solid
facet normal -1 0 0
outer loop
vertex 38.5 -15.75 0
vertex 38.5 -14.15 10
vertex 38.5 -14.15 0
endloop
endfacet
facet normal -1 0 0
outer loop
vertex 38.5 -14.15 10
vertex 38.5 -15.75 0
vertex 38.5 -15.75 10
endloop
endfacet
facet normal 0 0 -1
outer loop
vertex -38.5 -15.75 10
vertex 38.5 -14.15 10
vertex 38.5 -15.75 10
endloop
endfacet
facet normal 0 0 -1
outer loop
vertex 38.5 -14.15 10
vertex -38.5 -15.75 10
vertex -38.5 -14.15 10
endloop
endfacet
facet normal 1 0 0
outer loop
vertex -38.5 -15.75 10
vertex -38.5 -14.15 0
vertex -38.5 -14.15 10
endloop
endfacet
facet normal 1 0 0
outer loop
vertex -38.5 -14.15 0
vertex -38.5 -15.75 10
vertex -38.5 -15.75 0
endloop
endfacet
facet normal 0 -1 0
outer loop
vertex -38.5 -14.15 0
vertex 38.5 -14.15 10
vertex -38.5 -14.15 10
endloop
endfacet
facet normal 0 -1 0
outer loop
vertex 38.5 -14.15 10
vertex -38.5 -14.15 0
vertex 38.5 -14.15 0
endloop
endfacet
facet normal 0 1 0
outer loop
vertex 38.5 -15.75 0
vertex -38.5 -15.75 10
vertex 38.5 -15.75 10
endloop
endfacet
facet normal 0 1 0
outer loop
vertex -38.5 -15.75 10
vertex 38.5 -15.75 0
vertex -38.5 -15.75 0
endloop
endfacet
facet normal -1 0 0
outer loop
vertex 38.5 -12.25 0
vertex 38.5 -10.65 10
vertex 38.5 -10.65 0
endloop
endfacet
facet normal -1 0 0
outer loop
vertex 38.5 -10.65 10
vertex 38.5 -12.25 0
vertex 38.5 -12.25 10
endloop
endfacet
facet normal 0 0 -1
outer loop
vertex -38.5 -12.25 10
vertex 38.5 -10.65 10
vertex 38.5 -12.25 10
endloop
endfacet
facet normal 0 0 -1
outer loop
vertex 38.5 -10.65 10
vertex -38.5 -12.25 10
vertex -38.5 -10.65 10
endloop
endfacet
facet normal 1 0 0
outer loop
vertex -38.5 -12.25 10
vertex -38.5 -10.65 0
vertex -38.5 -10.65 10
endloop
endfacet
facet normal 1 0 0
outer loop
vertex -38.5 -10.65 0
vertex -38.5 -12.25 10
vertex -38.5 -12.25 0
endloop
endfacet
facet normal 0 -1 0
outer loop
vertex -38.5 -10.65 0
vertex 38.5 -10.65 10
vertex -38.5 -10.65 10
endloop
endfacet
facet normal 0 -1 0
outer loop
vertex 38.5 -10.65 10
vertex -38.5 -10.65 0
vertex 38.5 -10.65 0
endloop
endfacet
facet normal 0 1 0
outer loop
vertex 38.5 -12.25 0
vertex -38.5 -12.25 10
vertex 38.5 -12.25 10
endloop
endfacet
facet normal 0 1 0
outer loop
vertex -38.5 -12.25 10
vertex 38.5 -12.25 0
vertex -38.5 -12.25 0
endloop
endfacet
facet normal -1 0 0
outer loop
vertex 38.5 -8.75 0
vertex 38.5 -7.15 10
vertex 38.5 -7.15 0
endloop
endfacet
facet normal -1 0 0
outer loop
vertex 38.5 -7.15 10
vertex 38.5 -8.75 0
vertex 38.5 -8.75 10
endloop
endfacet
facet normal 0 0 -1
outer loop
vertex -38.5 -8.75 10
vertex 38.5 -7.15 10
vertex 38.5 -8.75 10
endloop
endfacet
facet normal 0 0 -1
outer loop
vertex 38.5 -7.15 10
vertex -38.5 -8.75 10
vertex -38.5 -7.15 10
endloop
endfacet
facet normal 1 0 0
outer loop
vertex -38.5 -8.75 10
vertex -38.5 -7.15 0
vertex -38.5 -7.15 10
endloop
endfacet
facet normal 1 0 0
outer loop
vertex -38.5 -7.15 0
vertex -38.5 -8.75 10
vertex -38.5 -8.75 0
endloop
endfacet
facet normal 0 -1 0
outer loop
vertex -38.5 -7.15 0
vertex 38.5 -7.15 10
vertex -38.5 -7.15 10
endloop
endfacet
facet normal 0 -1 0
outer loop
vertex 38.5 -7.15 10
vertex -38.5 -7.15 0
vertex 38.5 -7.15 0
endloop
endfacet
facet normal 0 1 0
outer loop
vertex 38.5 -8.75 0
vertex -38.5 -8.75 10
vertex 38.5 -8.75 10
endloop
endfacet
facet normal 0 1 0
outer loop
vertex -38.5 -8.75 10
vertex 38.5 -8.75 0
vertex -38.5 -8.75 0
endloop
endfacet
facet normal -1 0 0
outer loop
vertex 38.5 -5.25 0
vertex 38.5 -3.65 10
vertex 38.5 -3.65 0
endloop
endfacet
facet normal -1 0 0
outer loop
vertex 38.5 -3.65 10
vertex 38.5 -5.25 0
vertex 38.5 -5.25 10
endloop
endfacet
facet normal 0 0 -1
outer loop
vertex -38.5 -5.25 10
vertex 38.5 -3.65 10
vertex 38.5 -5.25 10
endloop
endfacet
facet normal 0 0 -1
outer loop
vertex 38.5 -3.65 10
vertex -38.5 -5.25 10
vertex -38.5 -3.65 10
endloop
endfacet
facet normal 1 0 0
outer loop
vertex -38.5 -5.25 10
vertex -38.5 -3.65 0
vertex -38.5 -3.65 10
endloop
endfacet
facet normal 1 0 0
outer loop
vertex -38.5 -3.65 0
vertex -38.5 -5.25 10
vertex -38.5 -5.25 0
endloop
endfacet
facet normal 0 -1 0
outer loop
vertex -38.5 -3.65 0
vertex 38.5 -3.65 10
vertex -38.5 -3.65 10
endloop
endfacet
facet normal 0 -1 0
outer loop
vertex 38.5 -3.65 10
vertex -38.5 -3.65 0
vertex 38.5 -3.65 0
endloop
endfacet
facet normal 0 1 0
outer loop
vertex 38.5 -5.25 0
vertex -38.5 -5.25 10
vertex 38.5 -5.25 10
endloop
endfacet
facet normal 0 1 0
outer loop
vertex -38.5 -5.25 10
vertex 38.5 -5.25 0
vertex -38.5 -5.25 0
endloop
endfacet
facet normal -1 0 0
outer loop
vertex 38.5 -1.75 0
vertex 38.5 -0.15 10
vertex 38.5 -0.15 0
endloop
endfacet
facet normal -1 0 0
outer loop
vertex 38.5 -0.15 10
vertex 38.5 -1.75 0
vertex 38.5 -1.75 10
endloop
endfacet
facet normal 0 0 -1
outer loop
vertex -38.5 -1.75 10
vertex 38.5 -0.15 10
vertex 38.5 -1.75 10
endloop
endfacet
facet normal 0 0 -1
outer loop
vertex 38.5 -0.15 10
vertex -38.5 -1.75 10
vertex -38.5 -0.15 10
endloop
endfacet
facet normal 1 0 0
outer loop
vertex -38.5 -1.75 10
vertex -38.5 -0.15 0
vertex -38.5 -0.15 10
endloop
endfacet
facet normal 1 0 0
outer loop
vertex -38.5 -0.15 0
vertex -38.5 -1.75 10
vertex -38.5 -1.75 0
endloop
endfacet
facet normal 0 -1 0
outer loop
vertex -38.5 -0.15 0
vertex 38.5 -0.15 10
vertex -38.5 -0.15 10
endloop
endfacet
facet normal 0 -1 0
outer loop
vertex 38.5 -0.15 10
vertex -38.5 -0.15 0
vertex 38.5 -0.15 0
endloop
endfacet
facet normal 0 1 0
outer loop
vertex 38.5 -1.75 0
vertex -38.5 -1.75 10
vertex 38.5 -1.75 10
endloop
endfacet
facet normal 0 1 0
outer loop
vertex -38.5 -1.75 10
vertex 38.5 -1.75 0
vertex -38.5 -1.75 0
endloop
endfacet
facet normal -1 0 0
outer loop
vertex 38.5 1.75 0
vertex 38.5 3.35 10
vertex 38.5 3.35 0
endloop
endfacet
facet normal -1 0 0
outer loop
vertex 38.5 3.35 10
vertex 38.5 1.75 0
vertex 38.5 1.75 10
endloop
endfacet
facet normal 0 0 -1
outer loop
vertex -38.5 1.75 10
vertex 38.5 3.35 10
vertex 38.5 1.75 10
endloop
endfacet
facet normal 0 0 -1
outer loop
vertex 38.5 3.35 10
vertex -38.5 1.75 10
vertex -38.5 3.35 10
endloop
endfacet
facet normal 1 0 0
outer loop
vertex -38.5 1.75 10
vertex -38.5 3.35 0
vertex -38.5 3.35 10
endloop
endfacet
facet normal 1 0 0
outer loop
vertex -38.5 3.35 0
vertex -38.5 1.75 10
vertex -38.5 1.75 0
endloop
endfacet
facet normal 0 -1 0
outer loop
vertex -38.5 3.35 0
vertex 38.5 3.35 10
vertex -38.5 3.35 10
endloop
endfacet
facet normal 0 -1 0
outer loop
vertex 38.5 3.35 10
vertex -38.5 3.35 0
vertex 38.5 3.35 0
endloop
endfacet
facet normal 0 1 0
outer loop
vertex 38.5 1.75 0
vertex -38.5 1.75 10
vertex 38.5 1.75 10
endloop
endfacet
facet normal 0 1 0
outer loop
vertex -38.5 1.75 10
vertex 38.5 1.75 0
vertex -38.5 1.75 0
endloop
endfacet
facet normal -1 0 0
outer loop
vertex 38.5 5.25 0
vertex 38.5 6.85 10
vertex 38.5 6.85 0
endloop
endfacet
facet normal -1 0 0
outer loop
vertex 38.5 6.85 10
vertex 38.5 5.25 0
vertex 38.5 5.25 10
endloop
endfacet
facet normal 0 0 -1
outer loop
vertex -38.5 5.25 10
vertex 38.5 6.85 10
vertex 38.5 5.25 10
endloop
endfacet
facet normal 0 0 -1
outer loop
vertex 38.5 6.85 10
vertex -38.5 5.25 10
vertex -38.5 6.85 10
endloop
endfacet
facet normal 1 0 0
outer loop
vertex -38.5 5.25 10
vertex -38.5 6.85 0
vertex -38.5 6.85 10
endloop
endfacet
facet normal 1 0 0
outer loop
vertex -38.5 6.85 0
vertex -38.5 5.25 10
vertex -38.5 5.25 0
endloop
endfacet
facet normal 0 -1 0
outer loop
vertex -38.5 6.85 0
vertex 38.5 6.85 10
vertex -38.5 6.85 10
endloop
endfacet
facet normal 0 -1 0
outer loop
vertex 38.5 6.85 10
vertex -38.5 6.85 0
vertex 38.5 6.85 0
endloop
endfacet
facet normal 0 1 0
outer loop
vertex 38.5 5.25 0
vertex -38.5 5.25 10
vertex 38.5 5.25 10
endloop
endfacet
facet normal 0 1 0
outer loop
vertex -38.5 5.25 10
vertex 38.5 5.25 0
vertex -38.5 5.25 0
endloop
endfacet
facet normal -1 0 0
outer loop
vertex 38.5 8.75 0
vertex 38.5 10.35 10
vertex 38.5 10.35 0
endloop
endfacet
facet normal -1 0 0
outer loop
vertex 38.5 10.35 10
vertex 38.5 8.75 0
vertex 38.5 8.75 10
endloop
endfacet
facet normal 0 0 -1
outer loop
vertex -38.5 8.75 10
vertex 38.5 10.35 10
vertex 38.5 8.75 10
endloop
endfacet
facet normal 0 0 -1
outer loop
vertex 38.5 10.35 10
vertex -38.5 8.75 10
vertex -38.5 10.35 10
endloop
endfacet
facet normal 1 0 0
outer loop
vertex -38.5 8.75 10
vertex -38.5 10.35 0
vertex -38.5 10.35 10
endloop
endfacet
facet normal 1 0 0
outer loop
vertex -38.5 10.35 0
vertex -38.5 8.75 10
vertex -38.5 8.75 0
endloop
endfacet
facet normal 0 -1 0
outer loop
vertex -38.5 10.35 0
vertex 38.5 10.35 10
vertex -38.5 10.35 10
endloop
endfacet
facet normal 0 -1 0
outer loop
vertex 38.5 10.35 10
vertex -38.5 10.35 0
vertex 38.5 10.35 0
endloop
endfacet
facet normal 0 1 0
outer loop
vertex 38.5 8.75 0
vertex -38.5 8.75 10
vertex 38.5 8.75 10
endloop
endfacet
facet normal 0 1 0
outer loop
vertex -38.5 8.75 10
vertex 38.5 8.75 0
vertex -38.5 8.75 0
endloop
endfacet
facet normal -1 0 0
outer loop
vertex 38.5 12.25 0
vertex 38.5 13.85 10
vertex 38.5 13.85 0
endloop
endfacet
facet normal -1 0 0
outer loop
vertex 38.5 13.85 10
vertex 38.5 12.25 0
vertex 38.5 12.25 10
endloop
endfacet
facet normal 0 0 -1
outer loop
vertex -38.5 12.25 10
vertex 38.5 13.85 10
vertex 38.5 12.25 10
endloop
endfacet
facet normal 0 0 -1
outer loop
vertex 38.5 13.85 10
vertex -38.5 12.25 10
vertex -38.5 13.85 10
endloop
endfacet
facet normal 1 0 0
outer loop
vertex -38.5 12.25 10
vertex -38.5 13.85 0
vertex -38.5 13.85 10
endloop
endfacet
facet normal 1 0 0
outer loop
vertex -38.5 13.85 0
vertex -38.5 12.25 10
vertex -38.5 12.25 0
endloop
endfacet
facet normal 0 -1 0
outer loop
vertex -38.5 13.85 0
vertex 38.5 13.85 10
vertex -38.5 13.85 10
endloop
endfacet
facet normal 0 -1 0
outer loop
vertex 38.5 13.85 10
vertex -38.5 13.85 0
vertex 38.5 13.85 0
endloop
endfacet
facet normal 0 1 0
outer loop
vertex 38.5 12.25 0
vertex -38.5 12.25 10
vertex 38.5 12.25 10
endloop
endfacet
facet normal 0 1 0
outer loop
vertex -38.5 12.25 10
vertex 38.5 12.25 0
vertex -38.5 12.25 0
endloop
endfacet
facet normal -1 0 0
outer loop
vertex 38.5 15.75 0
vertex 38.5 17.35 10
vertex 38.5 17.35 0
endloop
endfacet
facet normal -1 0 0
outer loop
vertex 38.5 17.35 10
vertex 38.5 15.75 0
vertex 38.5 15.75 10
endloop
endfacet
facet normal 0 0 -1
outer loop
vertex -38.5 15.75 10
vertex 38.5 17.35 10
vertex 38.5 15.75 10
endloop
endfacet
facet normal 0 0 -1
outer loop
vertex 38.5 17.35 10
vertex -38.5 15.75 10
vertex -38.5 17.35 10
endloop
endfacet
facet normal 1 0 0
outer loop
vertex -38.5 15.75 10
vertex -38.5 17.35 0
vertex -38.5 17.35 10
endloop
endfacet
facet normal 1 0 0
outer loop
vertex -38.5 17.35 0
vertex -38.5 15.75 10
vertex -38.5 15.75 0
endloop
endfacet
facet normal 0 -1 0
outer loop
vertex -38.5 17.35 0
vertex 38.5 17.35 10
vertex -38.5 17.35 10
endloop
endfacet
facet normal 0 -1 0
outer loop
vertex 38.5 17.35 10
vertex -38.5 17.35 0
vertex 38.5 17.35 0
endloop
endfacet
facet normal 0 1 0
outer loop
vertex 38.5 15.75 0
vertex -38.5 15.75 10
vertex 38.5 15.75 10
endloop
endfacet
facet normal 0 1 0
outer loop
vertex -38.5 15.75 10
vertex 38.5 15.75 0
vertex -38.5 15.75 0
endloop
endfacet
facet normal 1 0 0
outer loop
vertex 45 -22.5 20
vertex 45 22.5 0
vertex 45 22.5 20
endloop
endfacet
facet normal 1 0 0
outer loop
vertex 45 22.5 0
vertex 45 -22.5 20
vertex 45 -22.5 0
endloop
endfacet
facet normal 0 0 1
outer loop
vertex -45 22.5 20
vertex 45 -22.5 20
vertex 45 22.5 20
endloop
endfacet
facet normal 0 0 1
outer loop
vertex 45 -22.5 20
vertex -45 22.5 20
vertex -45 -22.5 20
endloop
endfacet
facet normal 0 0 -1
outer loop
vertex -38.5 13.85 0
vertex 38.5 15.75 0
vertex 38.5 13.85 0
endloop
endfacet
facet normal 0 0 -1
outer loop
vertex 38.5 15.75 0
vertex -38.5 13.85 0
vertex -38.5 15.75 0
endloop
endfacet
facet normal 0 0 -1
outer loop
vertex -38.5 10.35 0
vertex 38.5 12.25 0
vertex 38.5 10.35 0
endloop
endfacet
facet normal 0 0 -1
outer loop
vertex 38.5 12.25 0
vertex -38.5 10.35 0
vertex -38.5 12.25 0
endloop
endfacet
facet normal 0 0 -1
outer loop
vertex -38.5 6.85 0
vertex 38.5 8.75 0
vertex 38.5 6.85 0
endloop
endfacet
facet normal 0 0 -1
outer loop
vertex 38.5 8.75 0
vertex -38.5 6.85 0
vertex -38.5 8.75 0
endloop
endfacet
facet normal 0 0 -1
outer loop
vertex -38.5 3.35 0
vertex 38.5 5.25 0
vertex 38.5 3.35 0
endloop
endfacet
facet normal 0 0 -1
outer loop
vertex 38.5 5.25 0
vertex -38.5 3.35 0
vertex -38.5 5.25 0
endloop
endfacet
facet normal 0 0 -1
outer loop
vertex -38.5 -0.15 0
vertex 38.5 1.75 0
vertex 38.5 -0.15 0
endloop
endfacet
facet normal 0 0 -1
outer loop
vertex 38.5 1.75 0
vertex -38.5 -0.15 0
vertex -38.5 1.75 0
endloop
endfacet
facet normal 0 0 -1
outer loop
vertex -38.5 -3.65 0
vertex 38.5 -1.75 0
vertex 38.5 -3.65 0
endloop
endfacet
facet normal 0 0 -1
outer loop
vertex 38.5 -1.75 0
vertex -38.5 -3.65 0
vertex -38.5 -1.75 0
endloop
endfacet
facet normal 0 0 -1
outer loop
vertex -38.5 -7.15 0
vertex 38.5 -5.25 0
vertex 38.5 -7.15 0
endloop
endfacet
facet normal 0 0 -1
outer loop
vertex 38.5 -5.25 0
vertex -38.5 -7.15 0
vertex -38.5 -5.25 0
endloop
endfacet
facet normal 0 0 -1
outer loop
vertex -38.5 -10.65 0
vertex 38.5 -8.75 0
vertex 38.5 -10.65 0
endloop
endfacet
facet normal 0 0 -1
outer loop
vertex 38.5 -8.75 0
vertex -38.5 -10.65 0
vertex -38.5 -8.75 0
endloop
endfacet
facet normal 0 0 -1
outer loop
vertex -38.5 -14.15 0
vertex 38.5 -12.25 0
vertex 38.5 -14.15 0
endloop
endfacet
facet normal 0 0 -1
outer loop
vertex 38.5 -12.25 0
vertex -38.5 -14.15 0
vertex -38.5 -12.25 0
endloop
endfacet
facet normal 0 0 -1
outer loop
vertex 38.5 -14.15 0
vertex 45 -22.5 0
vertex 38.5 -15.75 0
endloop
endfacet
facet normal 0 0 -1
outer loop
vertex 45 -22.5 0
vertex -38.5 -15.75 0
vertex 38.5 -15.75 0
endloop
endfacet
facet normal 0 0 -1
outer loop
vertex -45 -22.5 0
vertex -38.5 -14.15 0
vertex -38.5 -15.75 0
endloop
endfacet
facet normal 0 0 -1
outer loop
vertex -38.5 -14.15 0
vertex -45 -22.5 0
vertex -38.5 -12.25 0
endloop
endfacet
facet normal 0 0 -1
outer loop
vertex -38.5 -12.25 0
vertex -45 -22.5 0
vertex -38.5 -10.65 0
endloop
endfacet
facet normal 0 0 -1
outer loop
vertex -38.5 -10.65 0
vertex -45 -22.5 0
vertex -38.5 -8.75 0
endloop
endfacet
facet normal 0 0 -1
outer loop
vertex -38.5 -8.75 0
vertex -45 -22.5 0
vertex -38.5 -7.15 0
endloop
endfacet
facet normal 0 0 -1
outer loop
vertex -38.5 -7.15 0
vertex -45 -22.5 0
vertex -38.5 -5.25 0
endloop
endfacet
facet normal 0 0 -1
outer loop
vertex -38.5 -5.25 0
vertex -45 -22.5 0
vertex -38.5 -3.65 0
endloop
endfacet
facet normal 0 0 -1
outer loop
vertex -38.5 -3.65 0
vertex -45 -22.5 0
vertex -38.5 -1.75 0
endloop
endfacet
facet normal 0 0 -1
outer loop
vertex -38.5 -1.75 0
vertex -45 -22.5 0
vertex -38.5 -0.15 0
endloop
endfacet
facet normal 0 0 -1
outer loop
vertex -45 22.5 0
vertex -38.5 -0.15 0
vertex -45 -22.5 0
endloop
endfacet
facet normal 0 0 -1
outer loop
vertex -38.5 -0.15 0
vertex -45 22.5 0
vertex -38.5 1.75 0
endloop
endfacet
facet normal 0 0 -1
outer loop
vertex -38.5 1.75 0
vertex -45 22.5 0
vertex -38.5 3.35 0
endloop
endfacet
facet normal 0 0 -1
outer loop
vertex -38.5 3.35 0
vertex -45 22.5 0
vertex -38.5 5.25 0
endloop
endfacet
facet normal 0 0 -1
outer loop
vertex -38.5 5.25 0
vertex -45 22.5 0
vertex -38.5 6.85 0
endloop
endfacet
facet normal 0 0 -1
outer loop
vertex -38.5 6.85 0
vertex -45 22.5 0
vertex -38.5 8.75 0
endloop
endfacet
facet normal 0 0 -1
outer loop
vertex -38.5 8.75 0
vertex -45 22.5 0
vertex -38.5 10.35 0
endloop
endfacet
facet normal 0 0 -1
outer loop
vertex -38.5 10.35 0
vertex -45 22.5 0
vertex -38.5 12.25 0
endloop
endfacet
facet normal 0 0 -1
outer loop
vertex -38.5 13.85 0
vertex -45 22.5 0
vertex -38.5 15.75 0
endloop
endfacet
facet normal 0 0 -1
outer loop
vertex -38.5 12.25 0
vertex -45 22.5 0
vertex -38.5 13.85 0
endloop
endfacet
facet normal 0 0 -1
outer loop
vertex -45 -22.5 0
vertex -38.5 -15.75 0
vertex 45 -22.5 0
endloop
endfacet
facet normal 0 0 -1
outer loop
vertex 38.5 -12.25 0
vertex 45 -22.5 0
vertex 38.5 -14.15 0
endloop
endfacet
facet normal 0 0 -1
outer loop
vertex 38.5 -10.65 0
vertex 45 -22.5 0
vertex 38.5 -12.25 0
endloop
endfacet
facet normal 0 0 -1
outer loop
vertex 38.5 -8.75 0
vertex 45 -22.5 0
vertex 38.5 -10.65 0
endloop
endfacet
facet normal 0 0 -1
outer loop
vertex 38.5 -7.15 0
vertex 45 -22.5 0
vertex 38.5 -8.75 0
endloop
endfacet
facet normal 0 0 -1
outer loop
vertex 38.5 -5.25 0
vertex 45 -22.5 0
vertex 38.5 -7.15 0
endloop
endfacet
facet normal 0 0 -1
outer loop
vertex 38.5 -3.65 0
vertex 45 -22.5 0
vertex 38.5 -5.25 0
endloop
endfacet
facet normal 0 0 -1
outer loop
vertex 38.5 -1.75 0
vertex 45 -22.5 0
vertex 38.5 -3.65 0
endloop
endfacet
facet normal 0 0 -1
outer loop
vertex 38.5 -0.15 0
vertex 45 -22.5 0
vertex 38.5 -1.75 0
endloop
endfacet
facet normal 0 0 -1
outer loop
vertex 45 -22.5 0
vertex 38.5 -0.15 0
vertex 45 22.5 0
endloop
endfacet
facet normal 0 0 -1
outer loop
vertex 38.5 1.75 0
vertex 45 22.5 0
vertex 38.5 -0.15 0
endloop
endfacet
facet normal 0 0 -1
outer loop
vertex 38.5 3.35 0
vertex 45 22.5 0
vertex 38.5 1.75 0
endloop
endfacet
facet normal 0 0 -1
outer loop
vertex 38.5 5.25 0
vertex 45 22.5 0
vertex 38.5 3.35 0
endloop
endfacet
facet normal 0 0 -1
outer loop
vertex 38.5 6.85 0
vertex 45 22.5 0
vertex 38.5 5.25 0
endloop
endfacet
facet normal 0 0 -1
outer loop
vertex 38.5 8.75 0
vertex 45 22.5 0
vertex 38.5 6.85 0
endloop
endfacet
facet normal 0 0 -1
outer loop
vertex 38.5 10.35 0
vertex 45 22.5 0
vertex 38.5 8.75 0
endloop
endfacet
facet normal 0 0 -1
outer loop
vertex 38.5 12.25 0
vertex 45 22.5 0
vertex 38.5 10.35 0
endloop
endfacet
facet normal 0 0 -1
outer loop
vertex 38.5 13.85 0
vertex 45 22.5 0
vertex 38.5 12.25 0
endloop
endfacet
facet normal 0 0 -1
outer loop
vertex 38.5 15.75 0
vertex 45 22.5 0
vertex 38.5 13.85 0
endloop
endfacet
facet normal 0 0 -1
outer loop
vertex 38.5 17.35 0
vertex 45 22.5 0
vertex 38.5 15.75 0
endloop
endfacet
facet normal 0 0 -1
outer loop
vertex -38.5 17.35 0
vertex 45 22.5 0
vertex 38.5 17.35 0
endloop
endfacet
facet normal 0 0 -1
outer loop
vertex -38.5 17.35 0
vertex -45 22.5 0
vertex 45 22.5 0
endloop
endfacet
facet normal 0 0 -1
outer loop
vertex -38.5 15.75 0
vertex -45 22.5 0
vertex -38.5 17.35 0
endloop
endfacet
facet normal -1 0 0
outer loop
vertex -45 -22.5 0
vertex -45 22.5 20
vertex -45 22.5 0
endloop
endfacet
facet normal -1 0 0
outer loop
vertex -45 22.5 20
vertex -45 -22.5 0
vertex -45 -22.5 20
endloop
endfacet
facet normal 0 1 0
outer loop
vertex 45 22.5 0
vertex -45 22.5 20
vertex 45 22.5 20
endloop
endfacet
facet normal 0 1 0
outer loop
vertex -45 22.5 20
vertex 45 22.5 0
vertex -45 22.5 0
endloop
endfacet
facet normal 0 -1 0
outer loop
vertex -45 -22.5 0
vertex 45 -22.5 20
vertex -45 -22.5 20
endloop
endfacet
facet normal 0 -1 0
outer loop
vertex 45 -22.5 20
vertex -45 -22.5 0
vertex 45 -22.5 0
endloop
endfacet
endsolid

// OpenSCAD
// Microscope slide drying rack - solid base with 10 parallel slots for standing slides.

// Base dimensions
L_base = 90;
W_base = 45;
H_base = 20;

// Slide dimensions (standard 75x25x1 mm)
slide_len = 75;
slide_w   = 25;
slide_thk = 1;

// Slot dimensions
slot_len = 77;
slot_w   = 1.6;
slot_deep = 10;

// Spacing and positioning
slot_spacing = 3.5;
num_slots = 10;

$fn = 64;

difference() {
    // 1. The solid base block
    // Centre it in X and Y, sit it on Z=0
    translate([-L_base / 2, -W_base / 2, 0]) 
        cube([L_base, W_base, H_base]);

    // 2. Cut the 10 slots
    // Slots run along X, so they are long in X and narrow in Y.
    // They are cut into the top face, so they go down from Z = H_base.
    for (i = [0 : num_slots - 1]) {
        // Calculate Y position for this slot.
        // For a symmetric array centred at 0:
        // Position = (i - (num_slots - 1) / 2) * slot_spacing
        // Example i=0: (0 - 4.5) * 3.5 = -15.75
        // Example i=9: (9 - 4.5) * 3.5 = 15.75
        // Total span = 31.5, half span = 15.75. Correct.
        y_pos = (i - (num_slots - 1) / 2) * slot_spacing;
        
        // Slot geometry:
        // Length along X: slot_len
        // Width along Y: slot_w
        // Depth along Z: slot_deep
        
        // To cut a slot, we extrude a rectangle along Z downwards.
        // We extend slightly past the bottom to ensure clean cut.
        
        translate([
            -slot_len / 2,          // Centre in X
            y_pos,                  // Position in Y
            H_base - slot_deep      // Start at top of slot depth
        ]) {
            // Extrude a rectangle downwards (negative Z)
            translate([0, 0, -slot_deep - 0.1]) 
                cube([slot_len, slot_w, slot_deep + 0.1]);
        }
    }
}
